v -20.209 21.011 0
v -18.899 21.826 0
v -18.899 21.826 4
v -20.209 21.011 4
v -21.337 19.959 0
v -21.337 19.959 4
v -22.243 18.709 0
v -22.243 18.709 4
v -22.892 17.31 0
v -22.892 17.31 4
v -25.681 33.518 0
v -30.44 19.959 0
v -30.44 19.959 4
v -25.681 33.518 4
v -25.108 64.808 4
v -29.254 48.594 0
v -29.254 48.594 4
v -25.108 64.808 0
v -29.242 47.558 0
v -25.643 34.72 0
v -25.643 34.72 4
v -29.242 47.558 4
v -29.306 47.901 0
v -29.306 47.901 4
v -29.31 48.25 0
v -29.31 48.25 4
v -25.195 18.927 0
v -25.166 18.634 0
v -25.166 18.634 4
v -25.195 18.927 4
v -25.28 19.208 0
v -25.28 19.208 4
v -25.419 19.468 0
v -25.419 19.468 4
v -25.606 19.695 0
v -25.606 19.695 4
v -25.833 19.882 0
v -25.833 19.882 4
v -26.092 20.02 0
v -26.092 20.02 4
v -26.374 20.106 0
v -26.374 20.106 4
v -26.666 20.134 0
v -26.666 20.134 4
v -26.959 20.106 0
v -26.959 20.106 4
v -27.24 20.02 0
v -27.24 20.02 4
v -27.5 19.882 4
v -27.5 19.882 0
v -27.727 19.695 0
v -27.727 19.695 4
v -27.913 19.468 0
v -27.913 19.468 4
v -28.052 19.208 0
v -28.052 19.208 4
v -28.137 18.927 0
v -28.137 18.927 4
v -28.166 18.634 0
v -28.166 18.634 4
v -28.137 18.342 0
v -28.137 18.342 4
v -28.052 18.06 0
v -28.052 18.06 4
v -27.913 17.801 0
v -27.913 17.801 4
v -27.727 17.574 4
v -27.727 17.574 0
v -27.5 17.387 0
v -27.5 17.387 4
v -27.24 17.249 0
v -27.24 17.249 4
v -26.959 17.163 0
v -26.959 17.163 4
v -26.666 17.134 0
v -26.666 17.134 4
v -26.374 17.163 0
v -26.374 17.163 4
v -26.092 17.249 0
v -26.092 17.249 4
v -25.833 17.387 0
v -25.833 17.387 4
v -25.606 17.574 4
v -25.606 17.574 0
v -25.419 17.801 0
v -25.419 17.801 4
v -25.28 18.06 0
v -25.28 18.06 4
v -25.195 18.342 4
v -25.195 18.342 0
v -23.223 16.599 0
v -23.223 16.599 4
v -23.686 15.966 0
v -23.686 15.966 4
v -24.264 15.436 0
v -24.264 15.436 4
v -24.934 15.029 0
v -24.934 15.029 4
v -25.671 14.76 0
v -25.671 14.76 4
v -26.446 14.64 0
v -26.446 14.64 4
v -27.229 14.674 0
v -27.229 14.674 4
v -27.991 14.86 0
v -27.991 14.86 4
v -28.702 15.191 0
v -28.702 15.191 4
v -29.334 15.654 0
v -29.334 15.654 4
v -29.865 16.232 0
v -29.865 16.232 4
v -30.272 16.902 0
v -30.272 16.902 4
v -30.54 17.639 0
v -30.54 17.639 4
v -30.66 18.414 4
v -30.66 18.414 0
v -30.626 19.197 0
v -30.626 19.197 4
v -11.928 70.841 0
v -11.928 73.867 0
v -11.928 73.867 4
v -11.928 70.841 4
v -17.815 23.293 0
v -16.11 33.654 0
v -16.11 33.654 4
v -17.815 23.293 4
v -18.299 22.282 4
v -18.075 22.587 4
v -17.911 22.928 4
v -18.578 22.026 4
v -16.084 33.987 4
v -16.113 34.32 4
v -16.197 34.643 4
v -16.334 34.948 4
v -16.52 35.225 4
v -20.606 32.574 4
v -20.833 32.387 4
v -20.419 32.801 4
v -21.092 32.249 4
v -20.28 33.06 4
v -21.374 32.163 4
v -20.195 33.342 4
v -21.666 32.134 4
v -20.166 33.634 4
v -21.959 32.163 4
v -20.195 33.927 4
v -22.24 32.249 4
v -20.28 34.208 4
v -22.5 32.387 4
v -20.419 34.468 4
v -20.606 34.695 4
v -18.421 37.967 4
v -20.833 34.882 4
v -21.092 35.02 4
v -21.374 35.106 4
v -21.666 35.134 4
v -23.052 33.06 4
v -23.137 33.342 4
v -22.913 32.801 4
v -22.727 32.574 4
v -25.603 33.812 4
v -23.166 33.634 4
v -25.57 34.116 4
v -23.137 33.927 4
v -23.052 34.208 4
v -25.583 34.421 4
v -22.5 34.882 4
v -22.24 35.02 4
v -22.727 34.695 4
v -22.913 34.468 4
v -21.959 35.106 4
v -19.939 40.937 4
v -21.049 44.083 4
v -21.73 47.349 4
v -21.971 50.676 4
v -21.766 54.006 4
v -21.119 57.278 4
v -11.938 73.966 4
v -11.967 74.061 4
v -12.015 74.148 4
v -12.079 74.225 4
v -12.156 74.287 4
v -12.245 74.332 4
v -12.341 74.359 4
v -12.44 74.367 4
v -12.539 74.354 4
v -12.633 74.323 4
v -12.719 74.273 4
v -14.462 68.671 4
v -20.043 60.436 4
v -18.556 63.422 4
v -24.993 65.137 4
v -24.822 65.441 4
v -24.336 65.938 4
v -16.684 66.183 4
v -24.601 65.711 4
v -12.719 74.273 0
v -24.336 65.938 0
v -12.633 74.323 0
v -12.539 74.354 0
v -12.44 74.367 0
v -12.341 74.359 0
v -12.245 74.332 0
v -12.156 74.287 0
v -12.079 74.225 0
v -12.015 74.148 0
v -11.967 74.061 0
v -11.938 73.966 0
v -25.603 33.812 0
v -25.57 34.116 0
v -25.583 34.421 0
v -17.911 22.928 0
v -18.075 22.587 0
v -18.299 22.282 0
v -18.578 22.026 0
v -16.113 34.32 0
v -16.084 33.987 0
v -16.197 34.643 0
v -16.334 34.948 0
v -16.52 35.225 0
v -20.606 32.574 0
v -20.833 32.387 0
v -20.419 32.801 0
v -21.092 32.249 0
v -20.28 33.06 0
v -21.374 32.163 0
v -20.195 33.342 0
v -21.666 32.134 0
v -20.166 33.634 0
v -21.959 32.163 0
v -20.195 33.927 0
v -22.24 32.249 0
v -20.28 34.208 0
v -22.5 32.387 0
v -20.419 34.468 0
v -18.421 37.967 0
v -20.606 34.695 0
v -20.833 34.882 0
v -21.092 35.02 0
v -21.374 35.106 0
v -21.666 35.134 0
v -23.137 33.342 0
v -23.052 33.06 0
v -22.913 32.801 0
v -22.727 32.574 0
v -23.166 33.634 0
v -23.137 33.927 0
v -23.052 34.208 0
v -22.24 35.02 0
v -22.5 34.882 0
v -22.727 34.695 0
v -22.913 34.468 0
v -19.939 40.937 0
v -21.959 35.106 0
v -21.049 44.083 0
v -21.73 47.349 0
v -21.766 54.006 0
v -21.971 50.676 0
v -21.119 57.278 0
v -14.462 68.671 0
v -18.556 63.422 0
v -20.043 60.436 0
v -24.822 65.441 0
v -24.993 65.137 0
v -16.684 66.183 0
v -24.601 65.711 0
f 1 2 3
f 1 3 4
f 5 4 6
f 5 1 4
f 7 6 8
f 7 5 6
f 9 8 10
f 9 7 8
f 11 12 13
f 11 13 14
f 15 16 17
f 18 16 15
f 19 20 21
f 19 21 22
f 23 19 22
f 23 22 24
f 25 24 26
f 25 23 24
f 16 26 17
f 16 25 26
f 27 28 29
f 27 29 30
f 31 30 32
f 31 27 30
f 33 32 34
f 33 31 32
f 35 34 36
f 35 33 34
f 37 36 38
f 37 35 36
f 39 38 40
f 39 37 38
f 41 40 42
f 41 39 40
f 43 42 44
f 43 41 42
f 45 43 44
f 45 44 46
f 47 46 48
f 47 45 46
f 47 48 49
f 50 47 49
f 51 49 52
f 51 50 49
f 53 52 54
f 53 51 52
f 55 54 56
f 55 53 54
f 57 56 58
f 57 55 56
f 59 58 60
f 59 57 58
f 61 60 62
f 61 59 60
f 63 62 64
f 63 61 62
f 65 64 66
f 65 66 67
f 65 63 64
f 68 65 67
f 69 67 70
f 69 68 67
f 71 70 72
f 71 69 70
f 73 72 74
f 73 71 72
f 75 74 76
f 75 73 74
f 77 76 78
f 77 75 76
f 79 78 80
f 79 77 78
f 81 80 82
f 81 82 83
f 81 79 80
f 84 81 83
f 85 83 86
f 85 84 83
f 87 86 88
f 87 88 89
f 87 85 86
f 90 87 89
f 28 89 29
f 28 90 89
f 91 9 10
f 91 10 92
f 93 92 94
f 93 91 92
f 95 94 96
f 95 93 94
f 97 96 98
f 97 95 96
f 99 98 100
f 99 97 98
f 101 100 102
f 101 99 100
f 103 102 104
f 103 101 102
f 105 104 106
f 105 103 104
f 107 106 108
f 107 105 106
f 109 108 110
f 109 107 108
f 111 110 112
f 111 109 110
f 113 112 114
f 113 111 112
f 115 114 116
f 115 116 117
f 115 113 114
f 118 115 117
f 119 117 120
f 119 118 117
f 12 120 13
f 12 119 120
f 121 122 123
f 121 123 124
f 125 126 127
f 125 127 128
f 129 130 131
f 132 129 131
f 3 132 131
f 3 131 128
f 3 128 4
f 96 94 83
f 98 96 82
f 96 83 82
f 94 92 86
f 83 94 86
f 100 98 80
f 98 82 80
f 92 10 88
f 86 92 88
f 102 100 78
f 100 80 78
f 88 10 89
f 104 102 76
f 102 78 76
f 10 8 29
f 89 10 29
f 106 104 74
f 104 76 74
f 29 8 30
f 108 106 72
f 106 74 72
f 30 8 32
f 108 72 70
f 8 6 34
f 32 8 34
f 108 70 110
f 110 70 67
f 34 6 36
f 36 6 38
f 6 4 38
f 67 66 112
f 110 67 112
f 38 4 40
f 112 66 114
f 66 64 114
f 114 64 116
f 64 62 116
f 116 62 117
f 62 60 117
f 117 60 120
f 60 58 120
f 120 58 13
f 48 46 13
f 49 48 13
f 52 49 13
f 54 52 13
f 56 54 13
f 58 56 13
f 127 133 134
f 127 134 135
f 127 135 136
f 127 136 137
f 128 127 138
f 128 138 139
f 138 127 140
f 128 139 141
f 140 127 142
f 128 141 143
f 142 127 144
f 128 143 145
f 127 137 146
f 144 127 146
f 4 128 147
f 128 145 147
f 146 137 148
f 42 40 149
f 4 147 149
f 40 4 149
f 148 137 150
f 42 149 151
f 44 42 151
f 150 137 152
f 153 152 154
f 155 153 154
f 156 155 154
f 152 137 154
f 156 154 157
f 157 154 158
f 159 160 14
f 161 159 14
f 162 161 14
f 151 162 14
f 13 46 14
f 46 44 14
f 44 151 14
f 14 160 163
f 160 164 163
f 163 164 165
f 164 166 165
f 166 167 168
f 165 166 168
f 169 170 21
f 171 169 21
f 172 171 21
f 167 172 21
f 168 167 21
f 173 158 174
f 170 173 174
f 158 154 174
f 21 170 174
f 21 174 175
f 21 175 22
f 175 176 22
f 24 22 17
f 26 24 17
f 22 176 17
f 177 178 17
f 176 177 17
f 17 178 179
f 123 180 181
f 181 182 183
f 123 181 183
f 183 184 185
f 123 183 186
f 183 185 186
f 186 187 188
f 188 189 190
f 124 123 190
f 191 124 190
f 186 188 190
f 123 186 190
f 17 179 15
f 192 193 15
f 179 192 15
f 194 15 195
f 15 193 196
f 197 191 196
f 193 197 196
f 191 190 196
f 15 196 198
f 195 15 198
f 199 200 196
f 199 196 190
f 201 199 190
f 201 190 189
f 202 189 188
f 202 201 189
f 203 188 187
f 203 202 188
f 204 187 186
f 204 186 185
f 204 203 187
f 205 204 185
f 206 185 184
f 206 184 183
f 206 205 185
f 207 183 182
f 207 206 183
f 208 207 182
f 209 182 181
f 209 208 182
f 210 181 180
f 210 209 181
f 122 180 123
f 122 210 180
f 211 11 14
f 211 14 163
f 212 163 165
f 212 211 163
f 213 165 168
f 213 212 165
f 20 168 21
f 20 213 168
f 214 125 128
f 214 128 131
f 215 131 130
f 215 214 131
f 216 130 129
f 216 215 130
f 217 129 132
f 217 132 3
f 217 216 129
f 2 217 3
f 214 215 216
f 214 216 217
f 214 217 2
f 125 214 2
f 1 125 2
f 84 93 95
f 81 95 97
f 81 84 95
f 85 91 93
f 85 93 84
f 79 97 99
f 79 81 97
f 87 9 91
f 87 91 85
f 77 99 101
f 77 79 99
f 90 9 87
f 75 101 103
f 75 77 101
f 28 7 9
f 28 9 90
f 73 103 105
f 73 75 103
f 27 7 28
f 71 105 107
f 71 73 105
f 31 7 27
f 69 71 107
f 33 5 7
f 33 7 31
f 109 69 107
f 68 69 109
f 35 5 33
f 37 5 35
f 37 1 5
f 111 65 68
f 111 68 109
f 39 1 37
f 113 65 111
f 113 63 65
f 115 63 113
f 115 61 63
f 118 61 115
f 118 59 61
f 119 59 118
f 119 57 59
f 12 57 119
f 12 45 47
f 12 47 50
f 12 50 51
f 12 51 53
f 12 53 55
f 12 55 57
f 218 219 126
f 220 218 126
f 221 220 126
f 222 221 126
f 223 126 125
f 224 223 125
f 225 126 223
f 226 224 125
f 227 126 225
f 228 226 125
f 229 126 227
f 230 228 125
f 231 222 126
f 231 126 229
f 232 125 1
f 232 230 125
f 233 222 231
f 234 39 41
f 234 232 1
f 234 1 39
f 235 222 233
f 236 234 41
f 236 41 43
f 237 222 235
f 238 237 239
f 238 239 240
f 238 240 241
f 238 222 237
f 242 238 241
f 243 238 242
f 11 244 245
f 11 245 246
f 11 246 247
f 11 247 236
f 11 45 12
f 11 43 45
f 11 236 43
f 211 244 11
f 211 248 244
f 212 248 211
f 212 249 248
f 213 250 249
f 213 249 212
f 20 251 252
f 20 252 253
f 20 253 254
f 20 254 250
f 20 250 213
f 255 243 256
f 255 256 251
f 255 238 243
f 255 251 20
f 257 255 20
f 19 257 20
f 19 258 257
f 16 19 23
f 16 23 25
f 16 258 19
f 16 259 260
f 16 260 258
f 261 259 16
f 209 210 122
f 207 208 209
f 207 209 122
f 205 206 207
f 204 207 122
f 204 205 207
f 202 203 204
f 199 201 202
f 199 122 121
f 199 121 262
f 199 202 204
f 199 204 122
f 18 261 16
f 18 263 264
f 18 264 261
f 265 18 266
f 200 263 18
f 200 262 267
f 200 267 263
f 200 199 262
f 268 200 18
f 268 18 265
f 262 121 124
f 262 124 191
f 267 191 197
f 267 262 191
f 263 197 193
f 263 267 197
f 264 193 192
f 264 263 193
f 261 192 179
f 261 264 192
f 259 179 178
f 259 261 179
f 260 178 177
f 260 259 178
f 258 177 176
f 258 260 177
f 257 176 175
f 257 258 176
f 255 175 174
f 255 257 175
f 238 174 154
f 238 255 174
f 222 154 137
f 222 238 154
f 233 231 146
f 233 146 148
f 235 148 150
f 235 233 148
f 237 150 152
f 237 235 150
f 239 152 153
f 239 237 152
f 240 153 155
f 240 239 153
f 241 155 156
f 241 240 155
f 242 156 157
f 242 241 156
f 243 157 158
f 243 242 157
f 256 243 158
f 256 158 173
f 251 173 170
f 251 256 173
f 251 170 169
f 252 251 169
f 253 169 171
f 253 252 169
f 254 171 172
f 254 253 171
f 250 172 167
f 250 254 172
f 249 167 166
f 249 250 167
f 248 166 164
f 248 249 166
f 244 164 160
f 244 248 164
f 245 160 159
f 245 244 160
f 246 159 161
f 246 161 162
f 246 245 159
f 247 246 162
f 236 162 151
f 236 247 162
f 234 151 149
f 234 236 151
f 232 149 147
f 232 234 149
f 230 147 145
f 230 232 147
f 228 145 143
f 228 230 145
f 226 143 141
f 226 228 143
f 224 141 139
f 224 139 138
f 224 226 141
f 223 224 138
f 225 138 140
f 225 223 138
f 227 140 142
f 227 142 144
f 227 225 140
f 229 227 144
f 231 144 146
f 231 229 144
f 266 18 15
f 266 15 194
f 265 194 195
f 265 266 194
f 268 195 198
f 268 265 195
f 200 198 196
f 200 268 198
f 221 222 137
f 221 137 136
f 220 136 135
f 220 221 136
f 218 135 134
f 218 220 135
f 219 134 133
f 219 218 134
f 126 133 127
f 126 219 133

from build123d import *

# Parameters (mm, degrees)
SKETCH_1_R      = 1.5
EXTRUDE_1_DEPTH = 4


with BuildPart() as part:
    # 草图1 → 凸台-拉伸1 (new body)
    with BuildSketch(Plane.XY):
        with BuildLine():
            Line((-16.110282893, 33.654208826), (-17.814522763, 23.293438272))
            ThreePointArc((-17.814522763, 23.293438272), (-18.179793181, 22.42908037), (-18.899085656, 21.82645661))
            ThreePointArc((-18.899085656, 21.82645661), (-21.337272658, 19.958522776), (-22.891934151, 17.309568206))
            ThreePointArc((-22.891934151, 17.309568206), (-27.990948412, 14.860061819), (-30.440454799, 19.959076079))
            Line((-30.440454799, 19.959076079), (-25.681476272, 33.517536514))
            ThreePointArc((-25.681476272, 33.517536514), (-25.569637864, 34.115664062), (-25.6428361, 34.719738902))
            Line((-25.6428361, 34.719738902), (-29.24172024, 47.558366666))
            ThreePointArc((-29.24172024, 47.558366666), (-29.31581841, 48.075186607), (-29.253628902, 48.593574353))
            Line((-29.253628902, 48.593574353), (-25.108232608, 64.808221419))
            ThreePointArc((-25.108232608, 64.808221419), (-24.821945701, 65.441071196), (-24.336476636, 65.937839573))
            Line((-24.336476636, 65.937839573), (-12.719407819, 74.272976396))
            ThreePointArc((-12.719407819, 74.272976396), (-12.199607619, 74.311552327), (-11.927927269, 73.866726364))
            Line((-11.927927269, 73.866726364), (-11.927927269, 70.840856193))
            ThreePointArc((-11.927927269, 70.840856193), (-21.765630275, 54.0055336), (-16.519844581, 35.225485153))
            ThreePointArc((-16.519844581, 35.225485153), (-16.148427264, 34.483281689), (-16.110282893, 33.654208826))
        make_face()
        with Locations((-26.666194475, 18.634322143)):
            Circle(SKETCH_1_R, mode=Mode.SUBTRACT)
        with Locations((-21.666194475, 33.634322143)):
            Circle(SKETCH_1_R, mode=Mode.SUBTRACT)
    extrude(amount=EXTRUDE_1_DEPTH)


solid = part.part
